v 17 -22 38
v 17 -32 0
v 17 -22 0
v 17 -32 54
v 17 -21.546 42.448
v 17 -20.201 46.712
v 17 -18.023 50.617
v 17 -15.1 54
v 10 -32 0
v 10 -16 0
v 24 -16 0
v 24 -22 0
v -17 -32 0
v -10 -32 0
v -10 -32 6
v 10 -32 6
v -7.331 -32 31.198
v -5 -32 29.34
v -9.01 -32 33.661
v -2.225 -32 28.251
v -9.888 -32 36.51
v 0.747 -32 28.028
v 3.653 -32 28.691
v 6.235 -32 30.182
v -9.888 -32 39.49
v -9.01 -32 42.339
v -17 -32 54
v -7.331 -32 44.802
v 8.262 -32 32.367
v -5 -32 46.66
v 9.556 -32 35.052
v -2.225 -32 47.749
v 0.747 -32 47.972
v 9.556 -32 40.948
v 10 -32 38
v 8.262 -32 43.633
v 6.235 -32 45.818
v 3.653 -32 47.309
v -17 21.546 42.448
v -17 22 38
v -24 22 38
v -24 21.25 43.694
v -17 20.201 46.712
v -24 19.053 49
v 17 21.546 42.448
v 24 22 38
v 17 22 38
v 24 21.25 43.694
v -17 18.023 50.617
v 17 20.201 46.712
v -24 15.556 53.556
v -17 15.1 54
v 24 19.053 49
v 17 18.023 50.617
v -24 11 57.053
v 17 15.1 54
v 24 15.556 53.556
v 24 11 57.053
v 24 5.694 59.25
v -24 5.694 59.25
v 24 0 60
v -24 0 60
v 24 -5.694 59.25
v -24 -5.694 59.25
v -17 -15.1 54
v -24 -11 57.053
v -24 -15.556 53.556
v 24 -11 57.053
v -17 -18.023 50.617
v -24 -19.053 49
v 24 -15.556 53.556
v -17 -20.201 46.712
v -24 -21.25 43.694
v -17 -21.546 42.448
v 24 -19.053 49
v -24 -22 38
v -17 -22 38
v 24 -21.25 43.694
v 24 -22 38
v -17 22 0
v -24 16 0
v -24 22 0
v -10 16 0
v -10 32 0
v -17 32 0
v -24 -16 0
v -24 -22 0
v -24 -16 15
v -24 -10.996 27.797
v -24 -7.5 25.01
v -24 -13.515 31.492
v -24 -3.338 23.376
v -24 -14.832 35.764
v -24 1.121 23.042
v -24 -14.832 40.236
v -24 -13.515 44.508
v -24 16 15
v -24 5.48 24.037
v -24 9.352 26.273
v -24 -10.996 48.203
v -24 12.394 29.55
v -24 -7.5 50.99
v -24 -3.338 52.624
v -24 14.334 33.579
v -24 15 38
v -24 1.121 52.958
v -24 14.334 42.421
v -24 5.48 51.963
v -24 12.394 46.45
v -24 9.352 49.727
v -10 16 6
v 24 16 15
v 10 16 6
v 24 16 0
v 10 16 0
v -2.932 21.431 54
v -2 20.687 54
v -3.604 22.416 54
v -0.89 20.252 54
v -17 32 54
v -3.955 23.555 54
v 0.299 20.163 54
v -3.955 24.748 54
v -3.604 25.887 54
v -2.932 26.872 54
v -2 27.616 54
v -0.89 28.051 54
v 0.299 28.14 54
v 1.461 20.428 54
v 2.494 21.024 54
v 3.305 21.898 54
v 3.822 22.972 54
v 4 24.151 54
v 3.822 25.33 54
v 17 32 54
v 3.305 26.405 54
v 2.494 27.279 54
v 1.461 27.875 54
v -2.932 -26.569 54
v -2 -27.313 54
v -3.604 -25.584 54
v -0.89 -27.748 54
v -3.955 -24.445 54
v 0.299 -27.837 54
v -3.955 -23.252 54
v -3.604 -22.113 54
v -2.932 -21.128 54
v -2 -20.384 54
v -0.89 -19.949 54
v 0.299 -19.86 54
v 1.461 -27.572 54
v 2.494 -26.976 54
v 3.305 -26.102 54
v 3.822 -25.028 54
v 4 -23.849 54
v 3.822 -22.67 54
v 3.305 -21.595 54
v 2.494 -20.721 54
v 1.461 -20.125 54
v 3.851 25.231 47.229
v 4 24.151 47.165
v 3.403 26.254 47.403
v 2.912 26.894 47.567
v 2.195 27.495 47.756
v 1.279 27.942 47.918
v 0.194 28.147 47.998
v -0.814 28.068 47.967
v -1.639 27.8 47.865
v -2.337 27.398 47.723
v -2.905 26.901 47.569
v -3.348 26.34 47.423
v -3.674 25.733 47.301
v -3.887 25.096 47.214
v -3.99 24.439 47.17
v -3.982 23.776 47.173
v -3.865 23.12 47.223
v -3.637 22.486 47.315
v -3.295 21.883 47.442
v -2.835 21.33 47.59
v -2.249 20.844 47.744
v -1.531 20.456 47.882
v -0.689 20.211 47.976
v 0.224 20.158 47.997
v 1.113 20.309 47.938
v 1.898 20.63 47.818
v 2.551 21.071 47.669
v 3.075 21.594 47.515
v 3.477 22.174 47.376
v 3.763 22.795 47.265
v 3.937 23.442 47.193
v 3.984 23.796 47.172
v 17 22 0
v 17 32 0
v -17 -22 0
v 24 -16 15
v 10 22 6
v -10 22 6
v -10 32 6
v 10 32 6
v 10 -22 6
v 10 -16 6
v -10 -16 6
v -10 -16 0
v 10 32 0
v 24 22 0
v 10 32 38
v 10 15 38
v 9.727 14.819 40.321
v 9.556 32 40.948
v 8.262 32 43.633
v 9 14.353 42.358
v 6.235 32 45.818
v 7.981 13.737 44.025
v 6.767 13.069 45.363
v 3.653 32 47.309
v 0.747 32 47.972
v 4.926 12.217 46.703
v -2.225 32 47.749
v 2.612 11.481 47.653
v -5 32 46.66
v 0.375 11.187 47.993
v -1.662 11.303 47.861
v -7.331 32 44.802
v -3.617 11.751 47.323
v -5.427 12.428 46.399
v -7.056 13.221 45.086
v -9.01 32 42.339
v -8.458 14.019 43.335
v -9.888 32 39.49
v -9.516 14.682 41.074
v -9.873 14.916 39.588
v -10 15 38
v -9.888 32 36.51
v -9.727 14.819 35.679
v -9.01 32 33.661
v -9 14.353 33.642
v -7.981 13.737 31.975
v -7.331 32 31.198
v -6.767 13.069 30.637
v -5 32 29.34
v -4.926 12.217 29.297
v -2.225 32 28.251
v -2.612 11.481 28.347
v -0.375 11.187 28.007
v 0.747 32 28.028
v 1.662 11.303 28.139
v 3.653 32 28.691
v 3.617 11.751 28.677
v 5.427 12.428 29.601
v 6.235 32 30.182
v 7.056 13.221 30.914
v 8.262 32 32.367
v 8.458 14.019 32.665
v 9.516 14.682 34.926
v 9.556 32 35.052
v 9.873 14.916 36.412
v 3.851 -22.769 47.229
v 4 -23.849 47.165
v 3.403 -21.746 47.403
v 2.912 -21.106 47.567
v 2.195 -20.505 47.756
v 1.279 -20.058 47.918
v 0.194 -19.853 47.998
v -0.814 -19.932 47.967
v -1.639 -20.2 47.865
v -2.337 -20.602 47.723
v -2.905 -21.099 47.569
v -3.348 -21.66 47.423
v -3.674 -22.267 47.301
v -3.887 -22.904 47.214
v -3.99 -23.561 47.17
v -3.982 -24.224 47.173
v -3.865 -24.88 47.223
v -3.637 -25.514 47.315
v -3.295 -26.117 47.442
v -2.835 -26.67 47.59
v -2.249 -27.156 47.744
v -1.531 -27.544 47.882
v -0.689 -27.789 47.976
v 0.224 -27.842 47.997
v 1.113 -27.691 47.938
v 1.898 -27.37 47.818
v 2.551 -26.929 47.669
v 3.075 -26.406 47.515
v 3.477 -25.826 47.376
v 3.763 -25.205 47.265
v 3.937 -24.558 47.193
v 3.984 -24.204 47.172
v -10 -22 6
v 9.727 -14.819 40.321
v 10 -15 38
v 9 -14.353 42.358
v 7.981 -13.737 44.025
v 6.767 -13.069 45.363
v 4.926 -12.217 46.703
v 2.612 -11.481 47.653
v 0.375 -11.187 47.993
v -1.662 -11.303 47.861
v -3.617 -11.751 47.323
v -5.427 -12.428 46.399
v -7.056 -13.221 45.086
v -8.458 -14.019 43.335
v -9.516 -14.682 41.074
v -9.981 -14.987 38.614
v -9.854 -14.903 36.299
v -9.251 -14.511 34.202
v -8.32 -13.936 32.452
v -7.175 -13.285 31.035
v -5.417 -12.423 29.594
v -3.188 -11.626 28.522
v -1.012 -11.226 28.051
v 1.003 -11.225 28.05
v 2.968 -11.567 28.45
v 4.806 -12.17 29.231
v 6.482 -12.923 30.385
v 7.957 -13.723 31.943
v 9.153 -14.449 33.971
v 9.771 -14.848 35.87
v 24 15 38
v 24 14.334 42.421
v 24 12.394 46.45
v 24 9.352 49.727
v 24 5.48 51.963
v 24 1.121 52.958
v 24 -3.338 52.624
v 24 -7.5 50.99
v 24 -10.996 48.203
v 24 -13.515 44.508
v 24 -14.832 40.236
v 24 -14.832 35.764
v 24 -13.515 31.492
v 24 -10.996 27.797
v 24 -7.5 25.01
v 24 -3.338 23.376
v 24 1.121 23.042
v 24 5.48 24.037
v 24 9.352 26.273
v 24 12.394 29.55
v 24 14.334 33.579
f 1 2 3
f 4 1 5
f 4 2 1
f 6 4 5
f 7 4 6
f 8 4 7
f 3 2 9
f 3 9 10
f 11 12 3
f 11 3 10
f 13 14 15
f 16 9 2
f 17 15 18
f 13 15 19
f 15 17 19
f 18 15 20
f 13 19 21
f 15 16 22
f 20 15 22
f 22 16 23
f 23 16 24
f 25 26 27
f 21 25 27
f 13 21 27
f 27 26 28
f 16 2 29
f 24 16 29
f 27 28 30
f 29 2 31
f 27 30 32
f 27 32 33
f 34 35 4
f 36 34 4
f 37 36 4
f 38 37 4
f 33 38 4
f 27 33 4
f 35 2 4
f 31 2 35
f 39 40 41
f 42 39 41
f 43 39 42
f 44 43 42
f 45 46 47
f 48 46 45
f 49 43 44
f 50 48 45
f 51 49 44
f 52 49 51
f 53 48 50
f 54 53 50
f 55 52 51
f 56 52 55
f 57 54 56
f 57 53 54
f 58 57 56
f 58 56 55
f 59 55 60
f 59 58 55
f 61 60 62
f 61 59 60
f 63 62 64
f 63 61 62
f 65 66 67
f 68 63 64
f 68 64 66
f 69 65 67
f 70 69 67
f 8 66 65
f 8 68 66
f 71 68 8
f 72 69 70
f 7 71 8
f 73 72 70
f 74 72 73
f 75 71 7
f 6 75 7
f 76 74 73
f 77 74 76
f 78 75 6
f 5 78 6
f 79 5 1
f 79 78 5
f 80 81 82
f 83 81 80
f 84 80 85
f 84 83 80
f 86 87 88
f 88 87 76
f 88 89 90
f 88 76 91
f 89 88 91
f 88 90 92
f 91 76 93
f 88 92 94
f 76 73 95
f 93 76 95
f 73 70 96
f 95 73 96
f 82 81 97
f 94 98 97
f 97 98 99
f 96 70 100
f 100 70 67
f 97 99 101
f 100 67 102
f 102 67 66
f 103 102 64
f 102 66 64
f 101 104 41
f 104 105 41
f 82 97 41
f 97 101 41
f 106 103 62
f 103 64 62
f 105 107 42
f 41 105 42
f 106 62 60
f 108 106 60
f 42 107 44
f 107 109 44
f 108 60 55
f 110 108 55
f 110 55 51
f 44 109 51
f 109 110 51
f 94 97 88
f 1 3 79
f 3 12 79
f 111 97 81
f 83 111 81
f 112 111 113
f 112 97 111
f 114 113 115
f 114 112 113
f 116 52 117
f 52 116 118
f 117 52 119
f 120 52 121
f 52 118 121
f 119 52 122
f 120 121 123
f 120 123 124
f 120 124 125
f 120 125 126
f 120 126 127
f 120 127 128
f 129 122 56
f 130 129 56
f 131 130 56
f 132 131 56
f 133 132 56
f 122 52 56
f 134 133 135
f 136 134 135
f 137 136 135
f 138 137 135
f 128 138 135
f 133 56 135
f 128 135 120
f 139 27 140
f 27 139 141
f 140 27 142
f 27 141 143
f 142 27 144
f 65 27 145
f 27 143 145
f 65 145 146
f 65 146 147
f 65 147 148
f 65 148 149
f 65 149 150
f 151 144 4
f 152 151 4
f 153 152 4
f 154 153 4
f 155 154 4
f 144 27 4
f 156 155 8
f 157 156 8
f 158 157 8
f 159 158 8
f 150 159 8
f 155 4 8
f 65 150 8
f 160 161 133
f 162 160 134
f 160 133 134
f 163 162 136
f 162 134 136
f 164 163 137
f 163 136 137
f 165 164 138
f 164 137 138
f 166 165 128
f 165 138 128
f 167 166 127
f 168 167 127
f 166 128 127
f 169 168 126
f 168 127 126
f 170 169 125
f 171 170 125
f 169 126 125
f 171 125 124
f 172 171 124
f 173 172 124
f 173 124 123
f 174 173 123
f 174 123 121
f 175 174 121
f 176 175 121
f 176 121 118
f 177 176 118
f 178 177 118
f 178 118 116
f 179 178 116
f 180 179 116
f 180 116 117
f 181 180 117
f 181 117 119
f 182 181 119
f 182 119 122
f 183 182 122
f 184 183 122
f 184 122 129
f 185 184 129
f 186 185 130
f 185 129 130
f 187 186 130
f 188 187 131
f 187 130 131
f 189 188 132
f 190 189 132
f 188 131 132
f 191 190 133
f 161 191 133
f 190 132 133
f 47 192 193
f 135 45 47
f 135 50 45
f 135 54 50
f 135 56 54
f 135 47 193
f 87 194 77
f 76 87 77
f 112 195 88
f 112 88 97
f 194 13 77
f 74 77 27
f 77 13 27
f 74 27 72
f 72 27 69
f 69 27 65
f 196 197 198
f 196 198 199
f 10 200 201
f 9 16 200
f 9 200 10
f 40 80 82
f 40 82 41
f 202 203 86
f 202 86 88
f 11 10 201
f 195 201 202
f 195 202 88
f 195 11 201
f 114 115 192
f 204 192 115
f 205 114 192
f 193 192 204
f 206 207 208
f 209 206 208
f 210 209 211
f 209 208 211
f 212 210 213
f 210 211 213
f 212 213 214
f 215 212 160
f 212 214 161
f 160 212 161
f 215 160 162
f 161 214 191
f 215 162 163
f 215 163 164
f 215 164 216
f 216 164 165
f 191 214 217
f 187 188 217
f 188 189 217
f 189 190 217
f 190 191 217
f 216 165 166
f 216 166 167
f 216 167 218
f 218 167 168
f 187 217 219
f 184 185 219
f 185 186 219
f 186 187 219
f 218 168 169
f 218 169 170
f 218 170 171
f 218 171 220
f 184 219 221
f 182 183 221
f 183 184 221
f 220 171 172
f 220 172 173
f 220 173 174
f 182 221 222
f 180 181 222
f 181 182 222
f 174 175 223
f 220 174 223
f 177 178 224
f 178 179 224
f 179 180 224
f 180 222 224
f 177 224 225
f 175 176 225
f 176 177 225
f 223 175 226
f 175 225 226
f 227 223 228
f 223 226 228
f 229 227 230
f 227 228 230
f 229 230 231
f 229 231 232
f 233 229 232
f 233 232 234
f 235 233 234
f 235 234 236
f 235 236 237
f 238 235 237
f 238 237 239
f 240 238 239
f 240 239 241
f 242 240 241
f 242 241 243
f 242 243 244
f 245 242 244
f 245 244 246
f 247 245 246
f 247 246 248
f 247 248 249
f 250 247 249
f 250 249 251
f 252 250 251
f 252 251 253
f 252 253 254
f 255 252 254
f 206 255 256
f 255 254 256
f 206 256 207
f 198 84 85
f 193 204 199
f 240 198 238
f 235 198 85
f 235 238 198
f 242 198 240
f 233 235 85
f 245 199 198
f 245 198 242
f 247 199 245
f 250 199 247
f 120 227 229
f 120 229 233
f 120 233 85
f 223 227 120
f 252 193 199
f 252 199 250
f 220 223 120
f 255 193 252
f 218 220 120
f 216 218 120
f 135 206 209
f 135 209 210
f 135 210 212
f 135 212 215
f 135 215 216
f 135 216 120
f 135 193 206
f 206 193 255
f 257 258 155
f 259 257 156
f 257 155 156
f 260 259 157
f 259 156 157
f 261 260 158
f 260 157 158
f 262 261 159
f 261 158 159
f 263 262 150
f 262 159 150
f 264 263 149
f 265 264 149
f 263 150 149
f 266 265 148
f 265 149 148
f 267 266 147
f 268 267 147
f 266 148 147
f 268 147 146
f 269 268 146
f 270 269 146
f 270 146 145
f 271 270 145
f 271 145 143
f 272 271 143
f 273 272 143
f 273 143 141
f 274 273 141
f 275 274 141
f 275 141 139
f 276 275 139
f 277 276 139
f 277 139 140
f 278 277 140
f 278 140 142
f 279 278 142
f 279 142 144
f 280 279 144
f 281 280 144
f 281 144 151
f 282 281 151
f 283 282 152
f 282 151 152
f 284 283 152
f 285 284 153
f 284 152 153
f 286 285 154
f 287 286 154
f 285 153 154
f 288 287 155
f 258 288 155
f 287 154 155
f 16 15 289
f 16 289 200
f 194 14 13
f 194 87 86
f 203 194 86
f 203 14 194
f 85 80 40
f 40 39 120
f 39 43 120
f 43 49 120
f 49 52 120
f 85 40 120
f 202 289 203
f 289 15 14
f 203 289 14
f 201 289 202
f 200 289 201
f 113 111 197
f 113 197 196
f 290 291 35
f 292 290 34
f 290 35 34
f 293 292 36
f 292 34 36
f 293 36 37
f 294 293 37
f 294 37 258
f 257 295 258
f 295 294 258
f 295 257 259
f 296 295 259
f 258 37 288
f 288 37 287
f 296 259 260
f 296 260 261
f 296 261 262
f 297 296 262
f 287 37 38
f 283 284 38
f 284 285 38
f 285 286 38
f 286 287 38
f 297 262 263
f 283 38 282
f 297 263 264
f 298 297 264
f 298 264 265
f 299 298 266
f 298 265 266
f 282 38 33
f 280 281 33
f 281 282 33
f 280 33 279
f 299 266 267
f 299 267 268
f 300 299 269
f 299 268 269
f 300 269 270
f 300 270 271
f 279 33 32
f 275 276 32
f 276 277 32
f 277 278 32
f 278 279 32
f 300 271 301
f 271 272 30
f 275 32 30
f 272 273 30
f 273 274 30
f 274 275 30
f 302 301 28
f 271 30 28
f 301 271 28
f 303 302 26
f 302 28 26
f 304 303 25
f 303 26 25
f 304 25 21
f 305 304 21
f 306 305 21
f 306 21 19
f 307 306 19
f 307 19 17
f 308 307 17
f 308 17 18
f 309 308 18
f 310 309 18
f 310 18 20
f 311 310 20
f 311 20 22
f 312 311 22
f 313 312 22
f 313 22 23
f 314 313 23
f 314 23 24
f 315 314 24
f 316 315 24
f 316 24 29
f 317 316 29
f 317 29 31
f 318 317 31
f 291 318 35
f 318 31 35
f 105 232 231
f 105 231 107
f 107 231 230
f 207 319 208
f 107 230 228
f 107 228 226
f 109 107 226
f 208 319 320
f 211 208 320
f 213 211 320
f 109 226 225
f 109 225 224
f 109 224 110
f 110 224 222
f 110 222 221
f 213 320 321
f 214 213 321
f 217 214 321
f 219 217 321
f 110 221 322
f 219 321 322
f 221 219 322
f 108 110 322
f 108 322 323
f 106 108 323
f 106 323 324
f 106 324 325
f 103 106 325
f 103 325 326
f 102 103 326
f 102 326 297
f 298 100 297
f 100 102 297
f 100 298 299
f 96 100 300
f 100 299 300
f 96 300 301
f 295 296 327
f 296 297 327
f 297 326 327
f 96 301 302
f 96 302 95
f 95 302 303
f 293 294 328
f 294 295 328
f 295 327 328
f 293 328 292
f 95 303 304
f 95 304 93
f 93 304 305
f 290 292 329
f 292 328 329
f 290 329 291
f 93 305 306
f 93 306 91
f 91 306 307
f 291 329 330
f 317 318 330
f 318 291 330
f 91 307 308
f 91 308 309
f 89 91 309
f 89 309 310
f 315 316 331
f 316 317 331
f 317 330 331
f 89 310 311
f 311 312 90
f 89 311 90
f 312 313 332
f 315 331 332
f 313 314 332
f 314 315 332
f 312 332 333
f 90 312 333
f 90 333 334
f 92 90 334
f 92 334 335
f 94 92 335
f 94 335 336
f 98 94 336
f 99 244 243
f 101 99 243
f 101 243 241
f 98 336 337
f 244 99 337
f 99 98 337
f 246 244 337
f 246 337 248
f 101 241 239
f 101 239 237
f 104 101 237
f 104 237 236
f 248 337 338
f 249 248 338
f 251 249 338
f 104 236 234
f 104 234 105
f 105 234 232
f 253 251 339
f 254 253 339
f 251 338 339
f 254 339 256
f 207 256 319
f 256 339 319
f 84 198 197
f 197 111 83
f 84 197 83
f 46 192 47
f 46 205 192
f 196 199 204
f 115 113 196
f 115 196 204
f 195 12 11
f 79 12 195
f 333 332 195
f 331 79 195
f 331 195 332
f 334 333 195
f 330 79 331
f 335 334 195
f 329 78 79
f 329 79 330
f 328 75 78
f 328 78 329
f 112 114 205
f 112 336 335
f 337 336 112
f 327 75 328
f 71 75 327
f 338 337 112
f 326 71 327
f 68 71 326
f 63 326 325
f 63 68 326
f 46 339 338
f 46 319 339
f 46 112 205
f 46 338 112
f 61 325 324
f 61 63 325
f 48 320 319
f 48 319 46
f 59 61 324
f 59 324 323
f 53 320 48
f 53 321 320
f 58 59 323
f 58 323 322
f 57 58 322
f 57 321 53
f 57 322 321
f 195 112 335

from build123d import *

# Parameters (mm, degrees)
SKETCH_W        = 64
SKETCH_H        = 54
PAD_DEPTH       = 17
SKETCH001_W     = 12.371217
SKETCH001_H     = 20
POCKET_DEPTH    = 64.001
SKETCH002_W     = 32
SKETCH002_H     = 23.71851
POCKET001_DEPTH = 34.001
PAD001_DEPTH    = 24
SKETCH005_R     = 10
POCKET002_DEPTH = 64.001
SKETCH006_W     = 20
SKETCH006_H     = 14.23518
POCKET003_DEPTH = 54.001
SKETCH007_R     = 15
POCKET004_DEPTH = 48.001
SKETCH008_R     = 4
POCKET005_DEPTH = 10


with BuildPart() as pocket001:
    # Sketch → Pad (new body, symmetric)
    with BuildSketch(Plane.YZ):
        with Locations((0, 27)):
            Rectangle(SKETCH_W, SKETCH_H)
    extrude(amount=PAD_DEPTH, both=True)

    # Sketch001 → Pocket (cut, through all)
    with BuildSketch(Plane(origin=(0, -32, 0), x_dir=(0, 0, -1), z_dir=(0, -1, 0))):
        with Locations((0.185608, 0)):
            Rectangle(SKETCH001_W, SKETCH001_H)
    extrude(amount=-POCKET_DEPTH, mode=Mode.SUBTRACT)

    # Sketch002 → Pocket001 (cut, through all)
    with BuildSketch(Plane.YZ.offset(17)):
        with Locations((0, 3.140745)):
            Rectangle(SKETCH002_W, SKETCH002_H)
    extrude(amount=-POCKET001_DEPTH, mode=Mode.SUBTRACT)


with BuildPart() as pocket005:
    # Sketch004 → Pad001 (new body, symmetric)
    with BuildSketch(Plane.YZ):
        with BuildLine():
            Line((-16, 0), (-16, 15))
            Line((-16, 15), (16, 15))
            Line((16, 15), (16, 0))
            Line((16, 0), (22, 0))
            Line((22, 0), (22, 38))
            ThreePointArc((22, 38), (0, 60.000055), (-22, 38))
            Line((-22, 0), (-22, 38))
            Line((-16, 0), (-22, 0))
        make_face()
    extrude(amount=PAD001_DEPTH, both=True)

    # Fusion: union Pocket001
    add(pocket001.part)

    # Sketch005 → Pocket002 (cut, through all)
    with BuildSketch(Plane.XZ.offset(32)):
        with Locations((0, 38)):
            Circle(SKETCH005_R)
    extrude(amount=-POCKET002_DEPTH, mode=Mode.SUBTRACT)

    # Sketch006 → Pocket003 (cut, through all)
    with BuildSketch(Plane.XZ.offset(22)):
        with Locations((0, -1.11759)):
            Rectangle(SKETCH006_W, SKETCH006_H)
    extrude(amount=-POCKET003_DEPTH, mode=Mode.SUBTRACT)

    # Sketch007 → Pocket004 (cut, through all)
    with BuildSketch(Plane.YZ.offset(24)):
        with Locations((0, 38)):
            Circle(SKETCH007_R)
    extrude(amount=-POCKET004_DEPTH, mode=Mode.SUBTRACT)

    # Sketch008 → Pocket005 (cut)
    with BuildSketch(Plane.XY.offset(54)):
        with Locations((0, -23.848572)):
            Circle(SKETCH008_R)
        with Locations((0, 24.151428)):
            Circle(SKETCH008_R)
    extrude(amount=-POCKET005_DEPTH, mode=Mode.SUBTRACT)


solid = pocket005.part
